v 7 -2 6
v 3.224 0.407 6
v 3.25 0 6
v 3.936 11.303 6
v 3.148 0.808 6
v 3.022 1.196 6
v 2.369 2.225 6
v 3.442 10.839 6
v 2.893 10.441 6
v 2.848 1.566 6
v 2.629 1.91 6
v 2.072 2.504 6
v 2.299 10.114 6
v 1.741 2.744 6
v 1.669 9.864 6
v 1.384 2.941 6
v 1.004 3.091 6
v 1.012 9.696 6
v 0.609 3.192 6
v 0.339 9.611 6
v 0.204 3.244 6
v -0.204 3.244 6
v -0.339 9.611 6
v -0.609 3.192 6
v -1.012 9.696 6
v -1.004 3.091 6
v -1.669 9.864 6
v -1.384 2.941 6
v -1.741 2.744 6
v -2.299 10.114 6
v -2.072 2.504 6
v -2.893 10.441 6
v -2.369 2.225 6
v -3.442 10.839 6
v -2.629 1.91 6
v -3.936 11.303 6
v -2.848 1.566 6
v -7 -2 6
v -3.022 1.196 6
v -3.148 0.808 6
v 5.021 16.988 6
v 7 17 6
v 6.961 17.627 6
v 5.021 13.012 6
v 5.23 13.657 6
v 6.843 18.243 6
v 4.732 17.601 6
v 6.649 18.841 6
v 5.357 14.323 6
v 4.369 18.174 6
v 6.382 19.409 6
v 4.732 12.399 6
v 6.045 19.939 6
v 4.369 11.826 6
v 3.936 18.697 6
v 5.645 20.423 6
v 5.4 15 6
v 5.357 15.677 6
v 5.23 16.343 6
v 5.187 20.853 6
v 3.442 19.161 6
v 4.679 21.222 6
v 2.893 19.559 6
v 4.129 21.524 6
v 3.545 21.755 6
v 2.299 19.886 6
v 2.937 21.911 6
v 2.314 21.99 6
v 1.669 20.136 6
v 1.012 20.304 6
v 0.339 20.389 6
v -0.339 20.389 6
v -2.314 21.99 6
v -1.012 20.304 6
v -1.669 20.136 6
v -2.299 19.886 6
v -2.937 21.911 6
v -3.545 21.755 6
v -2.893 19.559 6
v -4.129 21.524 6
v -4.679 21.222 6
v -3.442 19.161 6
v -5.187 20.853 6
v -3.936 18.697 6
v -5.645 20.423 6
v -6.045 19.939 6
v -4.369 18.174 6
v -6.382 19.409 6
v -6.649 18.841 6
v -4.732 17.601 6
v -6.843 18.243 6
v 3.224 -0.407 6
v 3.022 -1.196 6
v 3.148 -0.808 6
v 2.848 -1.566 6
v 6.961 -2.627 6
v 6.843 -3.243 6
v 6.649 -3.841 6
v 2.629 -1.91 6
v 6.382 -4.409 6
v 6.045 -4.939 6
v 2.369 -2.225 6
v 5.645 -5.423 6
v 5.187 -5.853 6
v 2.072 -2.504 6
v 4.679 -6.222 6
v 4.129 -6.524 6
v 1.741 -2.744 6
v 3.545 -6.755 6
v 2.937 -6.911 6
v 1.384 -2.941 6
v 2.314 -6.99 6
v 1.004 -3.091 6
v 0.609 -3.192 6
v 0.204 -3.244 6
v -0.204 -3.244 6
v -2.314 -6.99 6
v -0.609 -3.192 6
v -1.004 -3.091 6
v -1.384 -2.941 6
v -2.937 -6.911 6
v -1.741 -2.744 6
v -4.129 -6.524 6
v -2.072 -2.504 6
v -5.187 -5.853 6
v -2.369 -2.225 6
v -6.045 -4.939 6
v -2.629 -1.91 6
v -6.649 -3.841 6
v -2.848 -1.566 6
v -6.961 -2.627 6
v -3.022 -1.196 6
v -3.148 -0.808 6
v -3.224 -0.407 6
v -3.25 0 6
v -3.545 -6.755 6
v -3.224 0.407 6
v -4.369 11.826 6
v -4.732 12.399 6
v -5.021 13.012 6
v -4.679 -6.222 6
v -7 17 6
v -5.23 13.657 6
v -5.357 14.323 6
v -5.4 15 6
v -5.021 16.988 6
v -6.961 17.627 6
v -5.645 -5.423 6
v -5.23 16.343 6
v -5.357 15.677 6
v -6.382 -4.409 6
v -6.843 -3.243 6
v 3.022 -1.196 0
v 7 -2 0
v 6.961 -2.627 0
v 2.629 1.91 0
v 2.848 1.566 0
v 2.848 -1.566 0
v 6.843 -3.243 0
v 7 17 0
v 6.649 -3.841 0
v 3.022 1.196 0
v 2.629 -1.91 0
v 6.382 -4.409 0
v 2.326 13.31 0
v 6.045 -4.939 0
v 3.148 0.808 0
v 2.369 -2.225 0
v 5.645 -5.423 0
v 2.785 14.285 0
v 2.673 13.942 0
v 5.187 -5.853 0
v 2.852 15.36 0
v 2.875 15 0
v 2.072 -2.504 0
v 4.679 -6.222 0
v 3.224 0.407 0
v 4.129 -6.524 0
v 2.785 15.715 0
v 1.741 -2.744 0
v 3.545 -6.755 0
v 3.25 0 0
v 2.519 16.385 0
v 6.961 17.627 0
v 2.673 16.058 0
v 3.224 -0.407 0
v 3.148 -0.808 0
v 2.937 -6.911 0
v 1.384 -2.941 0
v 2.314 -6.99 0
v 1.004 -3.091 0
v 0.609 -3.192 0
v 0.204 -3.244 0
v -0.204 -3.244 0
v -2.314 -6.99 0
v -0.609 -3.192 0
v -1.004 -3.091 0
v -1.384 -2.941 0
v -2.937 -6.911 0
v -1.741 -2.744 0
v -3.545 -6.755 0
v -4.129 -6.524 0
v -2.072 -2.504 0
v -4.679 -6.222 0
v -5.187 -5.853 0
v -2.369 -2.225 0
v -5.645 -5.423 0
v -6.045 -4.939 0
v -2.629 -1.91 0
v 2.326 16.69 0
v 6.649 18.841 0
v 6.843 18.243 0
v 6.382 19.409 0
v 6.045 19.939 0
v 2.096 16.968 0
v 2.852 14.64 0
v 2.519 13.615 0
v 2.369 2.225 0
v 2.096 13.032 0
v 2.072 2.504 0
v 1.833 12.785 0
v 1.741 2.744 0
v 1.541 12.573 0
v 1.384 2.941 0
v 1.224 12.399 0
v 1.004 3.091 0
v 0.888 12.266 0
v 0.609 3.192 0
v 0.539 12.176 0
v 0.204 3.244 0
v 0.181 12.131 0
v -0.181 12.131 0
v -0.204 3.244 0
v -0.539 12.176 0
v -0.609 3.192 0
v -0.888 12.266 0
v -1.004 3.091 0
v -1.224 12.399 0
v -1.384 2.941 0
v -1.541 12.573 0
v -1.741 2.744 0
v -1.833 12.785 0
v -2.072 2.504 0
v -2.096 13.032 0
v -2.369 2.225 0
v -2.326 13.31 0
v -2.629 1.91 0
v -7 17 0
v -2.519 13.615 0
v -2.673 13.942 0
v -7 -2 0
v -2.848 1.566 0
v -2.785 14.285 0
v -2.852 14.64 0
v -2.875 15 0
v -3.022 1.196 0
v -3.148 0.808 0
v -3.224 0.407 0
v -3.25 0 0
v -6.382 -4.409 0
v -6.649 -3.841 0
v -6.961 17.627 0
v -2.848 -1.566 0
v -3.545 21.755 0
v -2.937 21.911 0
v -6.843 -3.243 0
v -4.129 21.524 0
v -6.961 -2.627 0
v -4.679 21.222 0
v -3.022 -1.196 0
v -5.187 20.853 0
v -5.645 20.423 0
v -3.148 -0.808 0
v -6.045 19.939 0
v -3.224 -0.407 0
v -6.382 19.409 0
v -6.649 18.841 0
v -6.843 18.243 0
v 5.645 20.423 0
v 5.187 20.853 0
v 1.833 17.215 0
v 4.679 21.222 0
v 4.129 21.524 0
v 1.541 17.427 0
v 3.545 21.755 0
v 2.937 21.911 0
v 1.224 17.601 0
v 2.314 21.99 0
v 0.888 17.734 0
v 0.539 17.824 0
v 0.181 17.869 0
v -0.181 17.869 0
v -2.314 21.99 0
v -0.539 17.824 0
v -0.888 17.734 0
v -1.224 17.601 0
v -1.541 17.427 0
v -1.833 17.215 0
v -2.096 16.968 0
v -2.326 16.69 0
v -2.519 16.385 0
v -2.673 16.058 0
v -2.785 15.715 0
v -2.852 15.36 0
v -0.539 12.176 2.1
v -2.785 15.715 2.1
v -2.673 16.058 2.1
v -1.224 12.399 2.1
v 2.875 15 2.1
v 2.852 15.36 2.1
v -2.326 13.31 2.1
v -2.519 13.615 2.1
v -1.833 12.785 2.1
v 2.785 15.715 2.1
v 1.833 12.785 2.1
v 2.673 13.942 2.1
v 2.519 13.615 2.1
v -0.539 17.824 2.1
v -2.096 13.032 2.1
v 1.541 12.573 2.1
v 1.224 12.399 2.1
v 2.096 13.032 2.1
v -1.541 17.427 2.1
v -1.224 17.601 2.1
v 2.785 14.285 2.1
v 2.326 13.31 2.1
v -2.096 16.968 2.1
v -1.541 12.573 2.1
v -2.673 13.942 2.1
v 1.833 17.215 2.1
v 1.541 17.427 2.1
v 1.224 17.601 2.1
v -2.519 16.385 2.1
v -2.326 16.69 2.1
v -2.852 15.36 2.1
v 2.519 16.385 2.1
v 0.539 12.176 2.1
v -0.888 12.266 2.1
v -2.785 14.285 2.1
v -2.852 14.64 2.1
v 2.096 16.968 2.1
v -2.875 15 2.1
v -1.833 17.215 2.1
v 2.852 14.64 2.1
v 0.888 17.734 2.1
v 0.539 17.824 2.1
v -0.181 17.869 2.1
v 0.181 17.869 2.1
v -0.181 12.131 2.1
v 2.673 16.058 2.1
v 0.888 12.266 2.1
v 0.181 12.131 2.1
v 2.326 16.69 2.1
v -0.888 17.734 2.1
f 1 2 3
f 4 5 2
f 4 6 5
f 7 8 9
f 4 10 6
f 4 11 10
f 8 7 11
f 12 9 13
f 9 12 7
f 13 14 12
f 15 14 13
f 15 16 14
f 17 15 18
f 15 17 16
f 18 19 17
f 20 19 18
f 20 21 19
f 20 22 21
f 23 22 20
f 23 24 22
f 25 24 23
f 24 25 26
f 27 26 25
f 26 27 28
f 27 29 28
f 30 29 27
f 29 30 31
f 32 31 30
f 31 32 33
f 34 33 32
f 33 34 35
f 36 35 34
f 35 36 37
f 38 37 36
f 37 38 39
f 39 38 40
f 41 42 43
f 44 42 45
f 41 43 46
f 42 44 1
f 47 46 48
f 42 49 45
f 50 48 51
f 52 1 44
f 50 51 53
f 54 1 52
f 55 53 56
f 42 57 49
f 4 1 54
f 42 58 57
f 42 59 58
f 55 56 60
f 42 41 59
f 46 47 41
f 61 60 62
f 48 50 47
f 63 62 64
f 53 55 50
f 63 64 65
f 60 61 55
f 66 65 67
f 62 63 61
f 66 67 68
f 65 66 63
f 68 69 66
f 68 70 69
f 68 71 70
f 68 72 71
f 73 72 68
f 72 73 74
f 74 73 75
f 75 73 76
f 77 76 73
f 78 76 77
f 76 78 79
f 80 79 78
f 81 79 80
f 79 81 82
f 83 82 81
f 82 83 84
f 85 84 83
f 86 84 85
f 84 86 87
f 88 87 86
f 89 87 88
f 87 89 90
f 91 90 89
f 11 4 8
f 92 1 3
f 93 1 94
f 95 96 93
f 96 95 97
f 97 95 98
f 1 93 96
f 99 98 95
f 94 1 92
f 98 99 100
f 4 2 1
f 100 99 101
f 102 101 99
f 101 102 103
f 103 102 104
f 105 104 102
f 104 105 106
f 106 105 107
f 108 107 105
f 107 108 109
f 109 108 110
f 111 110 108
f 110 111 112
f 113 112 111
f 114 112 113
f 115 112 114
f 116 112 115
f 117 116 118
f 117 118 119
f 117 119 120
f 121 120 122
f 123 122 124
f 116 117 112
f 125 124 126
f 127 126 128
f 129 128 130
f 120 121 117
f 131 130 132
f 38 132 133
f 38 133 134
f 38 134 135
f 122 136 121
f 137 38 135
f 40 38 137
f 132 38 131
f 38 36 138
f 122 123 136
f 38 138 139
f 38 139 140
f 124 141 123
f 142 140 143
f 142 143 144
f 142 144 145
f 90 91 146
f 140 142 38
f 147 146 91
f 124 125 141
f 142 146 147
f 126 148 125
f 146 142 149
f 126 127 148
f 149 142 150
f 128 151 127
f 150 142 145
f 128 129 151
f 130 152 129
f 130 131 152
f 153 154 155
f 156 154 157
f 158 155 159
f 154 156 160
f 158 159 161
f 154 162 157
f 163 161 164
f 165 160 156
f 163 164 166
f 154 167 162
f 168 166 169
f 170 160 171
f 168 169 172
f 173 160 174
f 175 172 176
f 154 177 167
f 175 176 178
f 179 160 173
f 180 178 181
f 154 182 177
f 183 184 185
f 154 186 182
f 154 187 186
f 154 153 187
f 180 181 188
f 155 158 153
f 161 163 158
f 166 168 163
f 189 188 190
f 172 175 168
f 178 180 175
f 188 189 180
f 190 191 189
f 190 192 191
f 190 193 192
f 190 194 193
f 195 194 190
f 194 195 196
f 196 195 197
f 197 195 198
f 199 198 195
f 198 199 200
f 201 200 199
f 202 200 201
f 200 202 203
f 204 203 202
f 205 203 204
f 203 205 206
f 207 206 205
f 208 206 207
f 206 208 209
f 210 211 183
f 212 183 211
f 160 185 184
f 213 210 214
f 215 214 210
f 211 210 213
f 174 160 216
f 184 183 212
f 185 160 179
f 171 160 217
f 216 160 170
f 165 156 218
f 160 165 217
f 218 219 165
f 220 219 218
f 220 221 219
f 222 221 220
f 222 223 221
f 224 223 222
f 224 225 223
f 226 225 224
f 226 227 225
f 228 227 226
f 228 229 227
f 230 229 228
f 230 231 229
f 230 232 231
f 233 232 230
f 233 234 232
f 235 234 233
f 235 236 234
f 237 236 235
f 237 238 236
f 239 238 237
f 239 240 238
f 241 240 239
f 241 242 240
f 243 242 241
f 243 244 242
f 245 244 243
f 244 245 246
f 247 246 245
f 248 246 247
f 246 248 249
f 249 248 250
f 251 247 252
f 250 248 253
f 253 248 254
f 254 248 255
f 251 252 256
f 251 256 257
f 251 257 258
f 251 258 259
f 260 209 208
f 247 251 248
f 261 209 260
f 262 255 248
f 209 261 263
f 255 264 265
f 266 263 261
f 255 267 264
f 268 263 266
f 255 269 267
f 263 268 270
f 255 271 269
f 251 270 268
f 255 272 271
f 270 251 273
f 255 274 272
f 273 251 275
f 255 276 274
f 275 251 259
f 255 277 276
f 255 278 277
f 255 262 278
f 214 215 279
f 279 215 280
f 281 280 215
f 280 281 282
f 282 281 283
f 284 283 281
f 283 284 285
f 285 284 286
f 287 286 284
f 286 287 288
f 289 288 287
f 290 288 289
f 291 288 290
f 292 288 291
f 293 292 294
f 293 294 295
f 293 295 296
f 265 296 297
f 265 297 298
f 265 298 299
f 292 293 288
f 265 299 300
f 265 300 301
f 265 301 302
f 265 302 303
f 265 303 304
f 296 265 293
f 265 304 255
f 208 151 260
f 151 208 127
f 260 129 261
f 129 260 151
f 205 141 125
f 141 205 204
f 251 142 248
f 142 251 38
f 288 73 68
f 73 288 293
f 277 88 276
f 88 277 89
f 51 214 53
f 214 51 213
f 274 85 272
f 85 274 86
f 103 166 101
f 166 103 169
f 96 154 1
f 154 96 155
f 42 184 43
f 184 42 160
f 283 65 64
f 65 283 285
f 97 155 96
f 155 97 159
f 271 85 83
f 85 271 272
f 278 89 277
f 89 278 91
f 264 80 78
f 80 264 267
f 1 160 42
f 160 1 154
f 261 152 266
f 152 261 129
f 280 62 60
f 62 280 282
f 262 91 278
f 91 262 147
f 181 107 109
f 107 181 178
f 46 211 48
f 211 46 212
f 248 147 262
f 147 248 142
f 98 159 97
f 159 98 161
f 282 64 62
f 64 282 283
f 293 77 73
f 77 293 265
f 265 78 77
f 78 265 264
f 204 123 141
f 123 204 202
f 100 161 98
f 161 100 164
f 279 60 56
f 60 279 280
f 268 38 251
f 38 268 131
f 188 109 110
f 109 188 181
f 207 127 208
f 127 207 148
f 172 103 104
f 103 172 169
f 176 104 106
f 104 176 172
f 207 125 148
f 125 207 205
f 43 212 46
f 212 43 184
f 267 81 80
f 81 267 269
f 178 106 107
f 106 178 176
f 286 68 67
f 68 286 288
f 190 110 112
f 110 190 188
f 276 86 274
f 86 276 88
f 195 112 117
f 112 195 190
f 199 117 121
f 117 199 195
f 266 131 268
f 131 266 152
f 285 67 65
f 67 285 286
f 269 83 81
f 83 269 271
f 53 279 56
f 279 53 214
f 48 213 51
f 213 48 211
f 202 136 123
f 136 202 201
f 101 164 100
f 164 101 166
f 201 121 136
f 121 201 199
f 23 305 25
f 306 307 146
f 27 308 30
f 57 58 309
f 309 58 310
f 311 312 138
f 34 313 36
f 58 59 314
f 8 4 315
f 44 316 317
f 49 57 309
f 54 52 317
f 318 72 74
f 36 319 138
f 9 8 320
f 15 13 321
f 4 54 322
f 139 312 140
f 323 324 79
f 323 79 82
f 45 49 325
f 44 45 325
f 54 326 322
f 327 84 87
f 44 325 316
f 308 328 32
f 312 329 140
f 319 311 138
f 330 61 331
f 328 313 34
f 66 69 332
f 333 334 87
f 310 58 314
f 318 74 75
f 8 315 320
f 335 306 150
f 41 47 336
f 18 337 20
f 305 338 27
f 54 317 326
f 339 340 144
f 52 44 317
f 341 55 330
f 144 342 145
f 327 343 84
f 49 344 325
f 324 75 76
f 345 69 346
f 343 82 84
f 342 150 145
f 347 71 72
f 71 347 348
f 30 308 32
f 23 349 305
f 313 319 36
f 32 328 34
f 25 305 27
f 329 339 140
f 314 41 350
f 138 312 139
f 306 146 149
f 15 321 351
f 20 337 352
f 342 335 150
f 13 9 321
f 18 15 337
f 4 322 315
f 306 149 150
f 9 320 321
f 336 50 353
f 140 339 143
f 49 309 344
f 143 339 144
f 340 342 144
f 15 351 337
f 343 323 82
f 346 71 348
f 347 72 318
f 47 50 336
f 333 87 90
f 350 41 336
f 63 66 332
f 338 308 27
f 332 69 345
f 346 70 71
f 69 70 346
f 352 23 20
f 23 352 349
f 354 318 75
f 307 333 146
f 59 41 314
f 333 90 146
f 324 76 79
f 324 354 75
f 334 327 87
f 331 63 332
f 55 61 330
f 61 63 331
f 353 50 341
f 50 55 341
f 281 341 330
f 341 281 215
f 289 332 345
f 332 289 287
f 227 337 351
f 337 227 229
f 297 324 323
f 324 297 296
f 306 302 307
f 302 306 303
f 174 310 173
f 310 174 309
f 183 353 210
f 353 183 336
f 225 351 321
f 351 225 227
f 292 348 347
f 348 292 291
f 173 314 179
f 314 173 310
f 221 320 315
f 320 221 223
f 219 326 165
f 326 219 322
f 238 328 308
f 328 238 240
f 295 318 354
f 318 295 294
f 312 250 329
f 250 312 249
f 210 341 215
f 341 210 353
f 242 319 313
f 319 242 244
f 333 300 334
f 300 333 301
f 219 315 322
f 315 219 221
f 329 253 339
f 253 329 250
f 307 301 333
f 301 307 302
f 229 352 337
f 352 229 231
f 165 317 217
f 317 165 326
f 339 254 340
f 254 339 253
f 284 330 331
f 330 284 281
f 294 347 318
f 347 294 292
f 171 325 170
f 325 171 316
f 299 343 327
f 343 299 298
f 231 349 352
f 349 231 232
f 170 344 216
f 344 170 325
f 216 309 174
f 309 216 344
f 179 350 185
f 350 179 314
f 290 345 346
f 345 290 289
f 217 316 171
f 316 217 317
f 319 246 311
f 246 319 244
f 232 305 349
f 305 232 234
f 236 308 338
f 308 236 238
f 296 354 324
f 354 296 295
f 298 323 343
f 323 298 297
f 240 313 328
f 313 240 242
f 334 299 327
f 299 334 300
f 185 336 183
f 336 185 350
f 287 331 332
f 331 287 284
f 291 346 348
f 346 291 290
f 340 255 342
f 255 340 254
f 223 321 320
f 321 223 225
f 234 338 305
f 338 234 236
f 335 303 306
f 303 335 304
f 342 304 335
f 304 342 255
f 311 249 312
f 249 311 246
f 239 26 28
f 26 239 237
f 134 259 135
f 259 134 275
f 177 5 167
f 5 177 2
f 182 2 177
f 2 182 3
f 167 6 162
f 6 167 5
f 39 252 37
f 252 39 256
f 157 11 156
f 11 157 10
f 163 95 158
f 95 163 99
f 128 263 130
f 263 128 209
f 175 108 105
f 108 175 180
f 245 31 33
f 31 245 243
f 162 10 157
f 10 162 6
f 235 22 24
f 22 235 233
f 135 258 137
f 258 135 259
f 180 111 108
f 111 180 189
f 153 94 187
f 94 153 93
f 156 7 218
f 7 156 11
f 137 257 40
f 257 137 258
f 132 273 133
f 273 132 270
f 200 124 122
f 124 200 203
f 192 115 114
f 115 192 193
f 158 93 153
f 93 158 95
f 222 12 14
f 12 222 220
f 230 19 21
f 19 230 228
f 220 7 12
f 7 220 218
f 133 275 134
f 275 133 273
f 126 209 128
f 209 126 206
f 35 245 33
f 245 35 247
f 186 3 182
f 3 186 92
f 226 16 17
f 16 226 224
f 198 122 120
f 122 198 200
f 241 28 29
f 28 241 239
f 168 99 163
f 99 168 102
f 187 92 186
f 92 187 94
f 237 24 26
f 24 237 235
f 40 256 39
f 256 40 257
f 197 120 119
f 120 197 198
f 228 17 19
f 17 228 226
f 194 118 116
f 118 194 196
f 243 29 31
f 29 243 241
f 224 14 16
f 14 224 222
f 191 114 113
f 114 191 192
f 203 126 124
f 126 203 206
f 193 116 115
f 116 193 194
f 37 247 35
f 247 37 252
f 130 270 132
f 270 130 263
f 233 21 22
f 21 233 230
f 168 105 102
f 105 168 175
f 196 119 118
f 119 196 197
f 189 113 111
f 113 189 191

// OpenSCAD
$fn = 50;


difference() {
	union() {
		cylinder(h = 6, r = 7.0000000000);
		translate(v = [0.0000000000, 7.5000000000, 0]) {
			hull() {
				translate(v = [-2.0000000000, 9.5000000000, 0]) {
					cylinder(h = 6, r = 5);
				}
				translate(v = [2.0000000000, 9.5000000000, 0]) {
					cylinder(h = 6, r = 5);
				}
				translate(v = [-2.0000000000, -9.5000000000, 0]) {
					cylinder(h = 6, r = 5);
				}
				translate(v = [2.0000000000, -9.5000000000, 0]) {
					cylinder(h = 6, r = 5);
				}
			}
		}
		translate(v = [0.0000000000, 7.5000000000, 0]) {
			hull() {
				translate(v = [-2.0000000000, 9.5000000000, 0]) {
					cylinder(h = 6, r = 5);
				}
				translate(v = [2.0000000000, 9.5000000000, 0]) {
					cylinder(h = 6, r = 5);
				}
				translate(v = [-2.0000000000, -9.5000000000, 0]) {
					cylinder(h = 6, r = 5);
				}
				translate(v = [2.0000000000, -9.5000000000, 0]) {
					cylinder(h = 6, r = 5);
				}
			}
		}
	}
	union() {
		translate(v = [0.0000000000, 15.0000000000, 6]) {
			rotate(a = [0, 0, 0]) {
				difference() {
					union() {
						#translate(v = [0, 0, -6.0000000000]) {
							cylinder(h = 6, r = 2.6000000000);
						}
						#translate(v = [0, 0, -3.9000000000]) {
							cylinder(h = 3.9000000000, r1 = 2.8750000000, r2 = 5.4000000000);
						}
						#translate(v = [0, 0, -6.0000000000]) {
							cylinder(h = 6, r = 2.8750000000);
						}
						#translate(v = [0, 0, -6.0000000000]) {
							cylinder(h = 6, r = 2.6000000000);
						}
					}
					union();
				}
			}
		}
		translate(v = [0.0000000000, 15.0000000000, 6]) {
			rotate(a = [0, 0, 0]) {
				difference() {
					union() {
						#translate(v = [0, 0, -6.0000000000]) {
							cylinder(h = 6, r = 2.6000000000);
						}
						#translate(v = [0, 0, -3.9000000000]) {
							cylinder(h = 3.9000000000, r1 = 2.8750000000, r2 = 5.4000000000);
						}
						#translate(v = [0, 0, -6.0000000000]) {
							cylinder(h = 6, r = 2.8750000000);
						}
						#translate(v = [0, 0, -6.0000000000]) {
							cylinder(h = 6, r = 2.6000000000);
						}
					}
					union();
				}
			}
		}
		translate(v = [0, 0, -100]) {
			cylinder(h = 200, r = 3.2500000000);
		}
		translate(v = [0, 0, -100]) {
			cylinder(h = 200, r = 1.8000000000);
		}
	}
}
